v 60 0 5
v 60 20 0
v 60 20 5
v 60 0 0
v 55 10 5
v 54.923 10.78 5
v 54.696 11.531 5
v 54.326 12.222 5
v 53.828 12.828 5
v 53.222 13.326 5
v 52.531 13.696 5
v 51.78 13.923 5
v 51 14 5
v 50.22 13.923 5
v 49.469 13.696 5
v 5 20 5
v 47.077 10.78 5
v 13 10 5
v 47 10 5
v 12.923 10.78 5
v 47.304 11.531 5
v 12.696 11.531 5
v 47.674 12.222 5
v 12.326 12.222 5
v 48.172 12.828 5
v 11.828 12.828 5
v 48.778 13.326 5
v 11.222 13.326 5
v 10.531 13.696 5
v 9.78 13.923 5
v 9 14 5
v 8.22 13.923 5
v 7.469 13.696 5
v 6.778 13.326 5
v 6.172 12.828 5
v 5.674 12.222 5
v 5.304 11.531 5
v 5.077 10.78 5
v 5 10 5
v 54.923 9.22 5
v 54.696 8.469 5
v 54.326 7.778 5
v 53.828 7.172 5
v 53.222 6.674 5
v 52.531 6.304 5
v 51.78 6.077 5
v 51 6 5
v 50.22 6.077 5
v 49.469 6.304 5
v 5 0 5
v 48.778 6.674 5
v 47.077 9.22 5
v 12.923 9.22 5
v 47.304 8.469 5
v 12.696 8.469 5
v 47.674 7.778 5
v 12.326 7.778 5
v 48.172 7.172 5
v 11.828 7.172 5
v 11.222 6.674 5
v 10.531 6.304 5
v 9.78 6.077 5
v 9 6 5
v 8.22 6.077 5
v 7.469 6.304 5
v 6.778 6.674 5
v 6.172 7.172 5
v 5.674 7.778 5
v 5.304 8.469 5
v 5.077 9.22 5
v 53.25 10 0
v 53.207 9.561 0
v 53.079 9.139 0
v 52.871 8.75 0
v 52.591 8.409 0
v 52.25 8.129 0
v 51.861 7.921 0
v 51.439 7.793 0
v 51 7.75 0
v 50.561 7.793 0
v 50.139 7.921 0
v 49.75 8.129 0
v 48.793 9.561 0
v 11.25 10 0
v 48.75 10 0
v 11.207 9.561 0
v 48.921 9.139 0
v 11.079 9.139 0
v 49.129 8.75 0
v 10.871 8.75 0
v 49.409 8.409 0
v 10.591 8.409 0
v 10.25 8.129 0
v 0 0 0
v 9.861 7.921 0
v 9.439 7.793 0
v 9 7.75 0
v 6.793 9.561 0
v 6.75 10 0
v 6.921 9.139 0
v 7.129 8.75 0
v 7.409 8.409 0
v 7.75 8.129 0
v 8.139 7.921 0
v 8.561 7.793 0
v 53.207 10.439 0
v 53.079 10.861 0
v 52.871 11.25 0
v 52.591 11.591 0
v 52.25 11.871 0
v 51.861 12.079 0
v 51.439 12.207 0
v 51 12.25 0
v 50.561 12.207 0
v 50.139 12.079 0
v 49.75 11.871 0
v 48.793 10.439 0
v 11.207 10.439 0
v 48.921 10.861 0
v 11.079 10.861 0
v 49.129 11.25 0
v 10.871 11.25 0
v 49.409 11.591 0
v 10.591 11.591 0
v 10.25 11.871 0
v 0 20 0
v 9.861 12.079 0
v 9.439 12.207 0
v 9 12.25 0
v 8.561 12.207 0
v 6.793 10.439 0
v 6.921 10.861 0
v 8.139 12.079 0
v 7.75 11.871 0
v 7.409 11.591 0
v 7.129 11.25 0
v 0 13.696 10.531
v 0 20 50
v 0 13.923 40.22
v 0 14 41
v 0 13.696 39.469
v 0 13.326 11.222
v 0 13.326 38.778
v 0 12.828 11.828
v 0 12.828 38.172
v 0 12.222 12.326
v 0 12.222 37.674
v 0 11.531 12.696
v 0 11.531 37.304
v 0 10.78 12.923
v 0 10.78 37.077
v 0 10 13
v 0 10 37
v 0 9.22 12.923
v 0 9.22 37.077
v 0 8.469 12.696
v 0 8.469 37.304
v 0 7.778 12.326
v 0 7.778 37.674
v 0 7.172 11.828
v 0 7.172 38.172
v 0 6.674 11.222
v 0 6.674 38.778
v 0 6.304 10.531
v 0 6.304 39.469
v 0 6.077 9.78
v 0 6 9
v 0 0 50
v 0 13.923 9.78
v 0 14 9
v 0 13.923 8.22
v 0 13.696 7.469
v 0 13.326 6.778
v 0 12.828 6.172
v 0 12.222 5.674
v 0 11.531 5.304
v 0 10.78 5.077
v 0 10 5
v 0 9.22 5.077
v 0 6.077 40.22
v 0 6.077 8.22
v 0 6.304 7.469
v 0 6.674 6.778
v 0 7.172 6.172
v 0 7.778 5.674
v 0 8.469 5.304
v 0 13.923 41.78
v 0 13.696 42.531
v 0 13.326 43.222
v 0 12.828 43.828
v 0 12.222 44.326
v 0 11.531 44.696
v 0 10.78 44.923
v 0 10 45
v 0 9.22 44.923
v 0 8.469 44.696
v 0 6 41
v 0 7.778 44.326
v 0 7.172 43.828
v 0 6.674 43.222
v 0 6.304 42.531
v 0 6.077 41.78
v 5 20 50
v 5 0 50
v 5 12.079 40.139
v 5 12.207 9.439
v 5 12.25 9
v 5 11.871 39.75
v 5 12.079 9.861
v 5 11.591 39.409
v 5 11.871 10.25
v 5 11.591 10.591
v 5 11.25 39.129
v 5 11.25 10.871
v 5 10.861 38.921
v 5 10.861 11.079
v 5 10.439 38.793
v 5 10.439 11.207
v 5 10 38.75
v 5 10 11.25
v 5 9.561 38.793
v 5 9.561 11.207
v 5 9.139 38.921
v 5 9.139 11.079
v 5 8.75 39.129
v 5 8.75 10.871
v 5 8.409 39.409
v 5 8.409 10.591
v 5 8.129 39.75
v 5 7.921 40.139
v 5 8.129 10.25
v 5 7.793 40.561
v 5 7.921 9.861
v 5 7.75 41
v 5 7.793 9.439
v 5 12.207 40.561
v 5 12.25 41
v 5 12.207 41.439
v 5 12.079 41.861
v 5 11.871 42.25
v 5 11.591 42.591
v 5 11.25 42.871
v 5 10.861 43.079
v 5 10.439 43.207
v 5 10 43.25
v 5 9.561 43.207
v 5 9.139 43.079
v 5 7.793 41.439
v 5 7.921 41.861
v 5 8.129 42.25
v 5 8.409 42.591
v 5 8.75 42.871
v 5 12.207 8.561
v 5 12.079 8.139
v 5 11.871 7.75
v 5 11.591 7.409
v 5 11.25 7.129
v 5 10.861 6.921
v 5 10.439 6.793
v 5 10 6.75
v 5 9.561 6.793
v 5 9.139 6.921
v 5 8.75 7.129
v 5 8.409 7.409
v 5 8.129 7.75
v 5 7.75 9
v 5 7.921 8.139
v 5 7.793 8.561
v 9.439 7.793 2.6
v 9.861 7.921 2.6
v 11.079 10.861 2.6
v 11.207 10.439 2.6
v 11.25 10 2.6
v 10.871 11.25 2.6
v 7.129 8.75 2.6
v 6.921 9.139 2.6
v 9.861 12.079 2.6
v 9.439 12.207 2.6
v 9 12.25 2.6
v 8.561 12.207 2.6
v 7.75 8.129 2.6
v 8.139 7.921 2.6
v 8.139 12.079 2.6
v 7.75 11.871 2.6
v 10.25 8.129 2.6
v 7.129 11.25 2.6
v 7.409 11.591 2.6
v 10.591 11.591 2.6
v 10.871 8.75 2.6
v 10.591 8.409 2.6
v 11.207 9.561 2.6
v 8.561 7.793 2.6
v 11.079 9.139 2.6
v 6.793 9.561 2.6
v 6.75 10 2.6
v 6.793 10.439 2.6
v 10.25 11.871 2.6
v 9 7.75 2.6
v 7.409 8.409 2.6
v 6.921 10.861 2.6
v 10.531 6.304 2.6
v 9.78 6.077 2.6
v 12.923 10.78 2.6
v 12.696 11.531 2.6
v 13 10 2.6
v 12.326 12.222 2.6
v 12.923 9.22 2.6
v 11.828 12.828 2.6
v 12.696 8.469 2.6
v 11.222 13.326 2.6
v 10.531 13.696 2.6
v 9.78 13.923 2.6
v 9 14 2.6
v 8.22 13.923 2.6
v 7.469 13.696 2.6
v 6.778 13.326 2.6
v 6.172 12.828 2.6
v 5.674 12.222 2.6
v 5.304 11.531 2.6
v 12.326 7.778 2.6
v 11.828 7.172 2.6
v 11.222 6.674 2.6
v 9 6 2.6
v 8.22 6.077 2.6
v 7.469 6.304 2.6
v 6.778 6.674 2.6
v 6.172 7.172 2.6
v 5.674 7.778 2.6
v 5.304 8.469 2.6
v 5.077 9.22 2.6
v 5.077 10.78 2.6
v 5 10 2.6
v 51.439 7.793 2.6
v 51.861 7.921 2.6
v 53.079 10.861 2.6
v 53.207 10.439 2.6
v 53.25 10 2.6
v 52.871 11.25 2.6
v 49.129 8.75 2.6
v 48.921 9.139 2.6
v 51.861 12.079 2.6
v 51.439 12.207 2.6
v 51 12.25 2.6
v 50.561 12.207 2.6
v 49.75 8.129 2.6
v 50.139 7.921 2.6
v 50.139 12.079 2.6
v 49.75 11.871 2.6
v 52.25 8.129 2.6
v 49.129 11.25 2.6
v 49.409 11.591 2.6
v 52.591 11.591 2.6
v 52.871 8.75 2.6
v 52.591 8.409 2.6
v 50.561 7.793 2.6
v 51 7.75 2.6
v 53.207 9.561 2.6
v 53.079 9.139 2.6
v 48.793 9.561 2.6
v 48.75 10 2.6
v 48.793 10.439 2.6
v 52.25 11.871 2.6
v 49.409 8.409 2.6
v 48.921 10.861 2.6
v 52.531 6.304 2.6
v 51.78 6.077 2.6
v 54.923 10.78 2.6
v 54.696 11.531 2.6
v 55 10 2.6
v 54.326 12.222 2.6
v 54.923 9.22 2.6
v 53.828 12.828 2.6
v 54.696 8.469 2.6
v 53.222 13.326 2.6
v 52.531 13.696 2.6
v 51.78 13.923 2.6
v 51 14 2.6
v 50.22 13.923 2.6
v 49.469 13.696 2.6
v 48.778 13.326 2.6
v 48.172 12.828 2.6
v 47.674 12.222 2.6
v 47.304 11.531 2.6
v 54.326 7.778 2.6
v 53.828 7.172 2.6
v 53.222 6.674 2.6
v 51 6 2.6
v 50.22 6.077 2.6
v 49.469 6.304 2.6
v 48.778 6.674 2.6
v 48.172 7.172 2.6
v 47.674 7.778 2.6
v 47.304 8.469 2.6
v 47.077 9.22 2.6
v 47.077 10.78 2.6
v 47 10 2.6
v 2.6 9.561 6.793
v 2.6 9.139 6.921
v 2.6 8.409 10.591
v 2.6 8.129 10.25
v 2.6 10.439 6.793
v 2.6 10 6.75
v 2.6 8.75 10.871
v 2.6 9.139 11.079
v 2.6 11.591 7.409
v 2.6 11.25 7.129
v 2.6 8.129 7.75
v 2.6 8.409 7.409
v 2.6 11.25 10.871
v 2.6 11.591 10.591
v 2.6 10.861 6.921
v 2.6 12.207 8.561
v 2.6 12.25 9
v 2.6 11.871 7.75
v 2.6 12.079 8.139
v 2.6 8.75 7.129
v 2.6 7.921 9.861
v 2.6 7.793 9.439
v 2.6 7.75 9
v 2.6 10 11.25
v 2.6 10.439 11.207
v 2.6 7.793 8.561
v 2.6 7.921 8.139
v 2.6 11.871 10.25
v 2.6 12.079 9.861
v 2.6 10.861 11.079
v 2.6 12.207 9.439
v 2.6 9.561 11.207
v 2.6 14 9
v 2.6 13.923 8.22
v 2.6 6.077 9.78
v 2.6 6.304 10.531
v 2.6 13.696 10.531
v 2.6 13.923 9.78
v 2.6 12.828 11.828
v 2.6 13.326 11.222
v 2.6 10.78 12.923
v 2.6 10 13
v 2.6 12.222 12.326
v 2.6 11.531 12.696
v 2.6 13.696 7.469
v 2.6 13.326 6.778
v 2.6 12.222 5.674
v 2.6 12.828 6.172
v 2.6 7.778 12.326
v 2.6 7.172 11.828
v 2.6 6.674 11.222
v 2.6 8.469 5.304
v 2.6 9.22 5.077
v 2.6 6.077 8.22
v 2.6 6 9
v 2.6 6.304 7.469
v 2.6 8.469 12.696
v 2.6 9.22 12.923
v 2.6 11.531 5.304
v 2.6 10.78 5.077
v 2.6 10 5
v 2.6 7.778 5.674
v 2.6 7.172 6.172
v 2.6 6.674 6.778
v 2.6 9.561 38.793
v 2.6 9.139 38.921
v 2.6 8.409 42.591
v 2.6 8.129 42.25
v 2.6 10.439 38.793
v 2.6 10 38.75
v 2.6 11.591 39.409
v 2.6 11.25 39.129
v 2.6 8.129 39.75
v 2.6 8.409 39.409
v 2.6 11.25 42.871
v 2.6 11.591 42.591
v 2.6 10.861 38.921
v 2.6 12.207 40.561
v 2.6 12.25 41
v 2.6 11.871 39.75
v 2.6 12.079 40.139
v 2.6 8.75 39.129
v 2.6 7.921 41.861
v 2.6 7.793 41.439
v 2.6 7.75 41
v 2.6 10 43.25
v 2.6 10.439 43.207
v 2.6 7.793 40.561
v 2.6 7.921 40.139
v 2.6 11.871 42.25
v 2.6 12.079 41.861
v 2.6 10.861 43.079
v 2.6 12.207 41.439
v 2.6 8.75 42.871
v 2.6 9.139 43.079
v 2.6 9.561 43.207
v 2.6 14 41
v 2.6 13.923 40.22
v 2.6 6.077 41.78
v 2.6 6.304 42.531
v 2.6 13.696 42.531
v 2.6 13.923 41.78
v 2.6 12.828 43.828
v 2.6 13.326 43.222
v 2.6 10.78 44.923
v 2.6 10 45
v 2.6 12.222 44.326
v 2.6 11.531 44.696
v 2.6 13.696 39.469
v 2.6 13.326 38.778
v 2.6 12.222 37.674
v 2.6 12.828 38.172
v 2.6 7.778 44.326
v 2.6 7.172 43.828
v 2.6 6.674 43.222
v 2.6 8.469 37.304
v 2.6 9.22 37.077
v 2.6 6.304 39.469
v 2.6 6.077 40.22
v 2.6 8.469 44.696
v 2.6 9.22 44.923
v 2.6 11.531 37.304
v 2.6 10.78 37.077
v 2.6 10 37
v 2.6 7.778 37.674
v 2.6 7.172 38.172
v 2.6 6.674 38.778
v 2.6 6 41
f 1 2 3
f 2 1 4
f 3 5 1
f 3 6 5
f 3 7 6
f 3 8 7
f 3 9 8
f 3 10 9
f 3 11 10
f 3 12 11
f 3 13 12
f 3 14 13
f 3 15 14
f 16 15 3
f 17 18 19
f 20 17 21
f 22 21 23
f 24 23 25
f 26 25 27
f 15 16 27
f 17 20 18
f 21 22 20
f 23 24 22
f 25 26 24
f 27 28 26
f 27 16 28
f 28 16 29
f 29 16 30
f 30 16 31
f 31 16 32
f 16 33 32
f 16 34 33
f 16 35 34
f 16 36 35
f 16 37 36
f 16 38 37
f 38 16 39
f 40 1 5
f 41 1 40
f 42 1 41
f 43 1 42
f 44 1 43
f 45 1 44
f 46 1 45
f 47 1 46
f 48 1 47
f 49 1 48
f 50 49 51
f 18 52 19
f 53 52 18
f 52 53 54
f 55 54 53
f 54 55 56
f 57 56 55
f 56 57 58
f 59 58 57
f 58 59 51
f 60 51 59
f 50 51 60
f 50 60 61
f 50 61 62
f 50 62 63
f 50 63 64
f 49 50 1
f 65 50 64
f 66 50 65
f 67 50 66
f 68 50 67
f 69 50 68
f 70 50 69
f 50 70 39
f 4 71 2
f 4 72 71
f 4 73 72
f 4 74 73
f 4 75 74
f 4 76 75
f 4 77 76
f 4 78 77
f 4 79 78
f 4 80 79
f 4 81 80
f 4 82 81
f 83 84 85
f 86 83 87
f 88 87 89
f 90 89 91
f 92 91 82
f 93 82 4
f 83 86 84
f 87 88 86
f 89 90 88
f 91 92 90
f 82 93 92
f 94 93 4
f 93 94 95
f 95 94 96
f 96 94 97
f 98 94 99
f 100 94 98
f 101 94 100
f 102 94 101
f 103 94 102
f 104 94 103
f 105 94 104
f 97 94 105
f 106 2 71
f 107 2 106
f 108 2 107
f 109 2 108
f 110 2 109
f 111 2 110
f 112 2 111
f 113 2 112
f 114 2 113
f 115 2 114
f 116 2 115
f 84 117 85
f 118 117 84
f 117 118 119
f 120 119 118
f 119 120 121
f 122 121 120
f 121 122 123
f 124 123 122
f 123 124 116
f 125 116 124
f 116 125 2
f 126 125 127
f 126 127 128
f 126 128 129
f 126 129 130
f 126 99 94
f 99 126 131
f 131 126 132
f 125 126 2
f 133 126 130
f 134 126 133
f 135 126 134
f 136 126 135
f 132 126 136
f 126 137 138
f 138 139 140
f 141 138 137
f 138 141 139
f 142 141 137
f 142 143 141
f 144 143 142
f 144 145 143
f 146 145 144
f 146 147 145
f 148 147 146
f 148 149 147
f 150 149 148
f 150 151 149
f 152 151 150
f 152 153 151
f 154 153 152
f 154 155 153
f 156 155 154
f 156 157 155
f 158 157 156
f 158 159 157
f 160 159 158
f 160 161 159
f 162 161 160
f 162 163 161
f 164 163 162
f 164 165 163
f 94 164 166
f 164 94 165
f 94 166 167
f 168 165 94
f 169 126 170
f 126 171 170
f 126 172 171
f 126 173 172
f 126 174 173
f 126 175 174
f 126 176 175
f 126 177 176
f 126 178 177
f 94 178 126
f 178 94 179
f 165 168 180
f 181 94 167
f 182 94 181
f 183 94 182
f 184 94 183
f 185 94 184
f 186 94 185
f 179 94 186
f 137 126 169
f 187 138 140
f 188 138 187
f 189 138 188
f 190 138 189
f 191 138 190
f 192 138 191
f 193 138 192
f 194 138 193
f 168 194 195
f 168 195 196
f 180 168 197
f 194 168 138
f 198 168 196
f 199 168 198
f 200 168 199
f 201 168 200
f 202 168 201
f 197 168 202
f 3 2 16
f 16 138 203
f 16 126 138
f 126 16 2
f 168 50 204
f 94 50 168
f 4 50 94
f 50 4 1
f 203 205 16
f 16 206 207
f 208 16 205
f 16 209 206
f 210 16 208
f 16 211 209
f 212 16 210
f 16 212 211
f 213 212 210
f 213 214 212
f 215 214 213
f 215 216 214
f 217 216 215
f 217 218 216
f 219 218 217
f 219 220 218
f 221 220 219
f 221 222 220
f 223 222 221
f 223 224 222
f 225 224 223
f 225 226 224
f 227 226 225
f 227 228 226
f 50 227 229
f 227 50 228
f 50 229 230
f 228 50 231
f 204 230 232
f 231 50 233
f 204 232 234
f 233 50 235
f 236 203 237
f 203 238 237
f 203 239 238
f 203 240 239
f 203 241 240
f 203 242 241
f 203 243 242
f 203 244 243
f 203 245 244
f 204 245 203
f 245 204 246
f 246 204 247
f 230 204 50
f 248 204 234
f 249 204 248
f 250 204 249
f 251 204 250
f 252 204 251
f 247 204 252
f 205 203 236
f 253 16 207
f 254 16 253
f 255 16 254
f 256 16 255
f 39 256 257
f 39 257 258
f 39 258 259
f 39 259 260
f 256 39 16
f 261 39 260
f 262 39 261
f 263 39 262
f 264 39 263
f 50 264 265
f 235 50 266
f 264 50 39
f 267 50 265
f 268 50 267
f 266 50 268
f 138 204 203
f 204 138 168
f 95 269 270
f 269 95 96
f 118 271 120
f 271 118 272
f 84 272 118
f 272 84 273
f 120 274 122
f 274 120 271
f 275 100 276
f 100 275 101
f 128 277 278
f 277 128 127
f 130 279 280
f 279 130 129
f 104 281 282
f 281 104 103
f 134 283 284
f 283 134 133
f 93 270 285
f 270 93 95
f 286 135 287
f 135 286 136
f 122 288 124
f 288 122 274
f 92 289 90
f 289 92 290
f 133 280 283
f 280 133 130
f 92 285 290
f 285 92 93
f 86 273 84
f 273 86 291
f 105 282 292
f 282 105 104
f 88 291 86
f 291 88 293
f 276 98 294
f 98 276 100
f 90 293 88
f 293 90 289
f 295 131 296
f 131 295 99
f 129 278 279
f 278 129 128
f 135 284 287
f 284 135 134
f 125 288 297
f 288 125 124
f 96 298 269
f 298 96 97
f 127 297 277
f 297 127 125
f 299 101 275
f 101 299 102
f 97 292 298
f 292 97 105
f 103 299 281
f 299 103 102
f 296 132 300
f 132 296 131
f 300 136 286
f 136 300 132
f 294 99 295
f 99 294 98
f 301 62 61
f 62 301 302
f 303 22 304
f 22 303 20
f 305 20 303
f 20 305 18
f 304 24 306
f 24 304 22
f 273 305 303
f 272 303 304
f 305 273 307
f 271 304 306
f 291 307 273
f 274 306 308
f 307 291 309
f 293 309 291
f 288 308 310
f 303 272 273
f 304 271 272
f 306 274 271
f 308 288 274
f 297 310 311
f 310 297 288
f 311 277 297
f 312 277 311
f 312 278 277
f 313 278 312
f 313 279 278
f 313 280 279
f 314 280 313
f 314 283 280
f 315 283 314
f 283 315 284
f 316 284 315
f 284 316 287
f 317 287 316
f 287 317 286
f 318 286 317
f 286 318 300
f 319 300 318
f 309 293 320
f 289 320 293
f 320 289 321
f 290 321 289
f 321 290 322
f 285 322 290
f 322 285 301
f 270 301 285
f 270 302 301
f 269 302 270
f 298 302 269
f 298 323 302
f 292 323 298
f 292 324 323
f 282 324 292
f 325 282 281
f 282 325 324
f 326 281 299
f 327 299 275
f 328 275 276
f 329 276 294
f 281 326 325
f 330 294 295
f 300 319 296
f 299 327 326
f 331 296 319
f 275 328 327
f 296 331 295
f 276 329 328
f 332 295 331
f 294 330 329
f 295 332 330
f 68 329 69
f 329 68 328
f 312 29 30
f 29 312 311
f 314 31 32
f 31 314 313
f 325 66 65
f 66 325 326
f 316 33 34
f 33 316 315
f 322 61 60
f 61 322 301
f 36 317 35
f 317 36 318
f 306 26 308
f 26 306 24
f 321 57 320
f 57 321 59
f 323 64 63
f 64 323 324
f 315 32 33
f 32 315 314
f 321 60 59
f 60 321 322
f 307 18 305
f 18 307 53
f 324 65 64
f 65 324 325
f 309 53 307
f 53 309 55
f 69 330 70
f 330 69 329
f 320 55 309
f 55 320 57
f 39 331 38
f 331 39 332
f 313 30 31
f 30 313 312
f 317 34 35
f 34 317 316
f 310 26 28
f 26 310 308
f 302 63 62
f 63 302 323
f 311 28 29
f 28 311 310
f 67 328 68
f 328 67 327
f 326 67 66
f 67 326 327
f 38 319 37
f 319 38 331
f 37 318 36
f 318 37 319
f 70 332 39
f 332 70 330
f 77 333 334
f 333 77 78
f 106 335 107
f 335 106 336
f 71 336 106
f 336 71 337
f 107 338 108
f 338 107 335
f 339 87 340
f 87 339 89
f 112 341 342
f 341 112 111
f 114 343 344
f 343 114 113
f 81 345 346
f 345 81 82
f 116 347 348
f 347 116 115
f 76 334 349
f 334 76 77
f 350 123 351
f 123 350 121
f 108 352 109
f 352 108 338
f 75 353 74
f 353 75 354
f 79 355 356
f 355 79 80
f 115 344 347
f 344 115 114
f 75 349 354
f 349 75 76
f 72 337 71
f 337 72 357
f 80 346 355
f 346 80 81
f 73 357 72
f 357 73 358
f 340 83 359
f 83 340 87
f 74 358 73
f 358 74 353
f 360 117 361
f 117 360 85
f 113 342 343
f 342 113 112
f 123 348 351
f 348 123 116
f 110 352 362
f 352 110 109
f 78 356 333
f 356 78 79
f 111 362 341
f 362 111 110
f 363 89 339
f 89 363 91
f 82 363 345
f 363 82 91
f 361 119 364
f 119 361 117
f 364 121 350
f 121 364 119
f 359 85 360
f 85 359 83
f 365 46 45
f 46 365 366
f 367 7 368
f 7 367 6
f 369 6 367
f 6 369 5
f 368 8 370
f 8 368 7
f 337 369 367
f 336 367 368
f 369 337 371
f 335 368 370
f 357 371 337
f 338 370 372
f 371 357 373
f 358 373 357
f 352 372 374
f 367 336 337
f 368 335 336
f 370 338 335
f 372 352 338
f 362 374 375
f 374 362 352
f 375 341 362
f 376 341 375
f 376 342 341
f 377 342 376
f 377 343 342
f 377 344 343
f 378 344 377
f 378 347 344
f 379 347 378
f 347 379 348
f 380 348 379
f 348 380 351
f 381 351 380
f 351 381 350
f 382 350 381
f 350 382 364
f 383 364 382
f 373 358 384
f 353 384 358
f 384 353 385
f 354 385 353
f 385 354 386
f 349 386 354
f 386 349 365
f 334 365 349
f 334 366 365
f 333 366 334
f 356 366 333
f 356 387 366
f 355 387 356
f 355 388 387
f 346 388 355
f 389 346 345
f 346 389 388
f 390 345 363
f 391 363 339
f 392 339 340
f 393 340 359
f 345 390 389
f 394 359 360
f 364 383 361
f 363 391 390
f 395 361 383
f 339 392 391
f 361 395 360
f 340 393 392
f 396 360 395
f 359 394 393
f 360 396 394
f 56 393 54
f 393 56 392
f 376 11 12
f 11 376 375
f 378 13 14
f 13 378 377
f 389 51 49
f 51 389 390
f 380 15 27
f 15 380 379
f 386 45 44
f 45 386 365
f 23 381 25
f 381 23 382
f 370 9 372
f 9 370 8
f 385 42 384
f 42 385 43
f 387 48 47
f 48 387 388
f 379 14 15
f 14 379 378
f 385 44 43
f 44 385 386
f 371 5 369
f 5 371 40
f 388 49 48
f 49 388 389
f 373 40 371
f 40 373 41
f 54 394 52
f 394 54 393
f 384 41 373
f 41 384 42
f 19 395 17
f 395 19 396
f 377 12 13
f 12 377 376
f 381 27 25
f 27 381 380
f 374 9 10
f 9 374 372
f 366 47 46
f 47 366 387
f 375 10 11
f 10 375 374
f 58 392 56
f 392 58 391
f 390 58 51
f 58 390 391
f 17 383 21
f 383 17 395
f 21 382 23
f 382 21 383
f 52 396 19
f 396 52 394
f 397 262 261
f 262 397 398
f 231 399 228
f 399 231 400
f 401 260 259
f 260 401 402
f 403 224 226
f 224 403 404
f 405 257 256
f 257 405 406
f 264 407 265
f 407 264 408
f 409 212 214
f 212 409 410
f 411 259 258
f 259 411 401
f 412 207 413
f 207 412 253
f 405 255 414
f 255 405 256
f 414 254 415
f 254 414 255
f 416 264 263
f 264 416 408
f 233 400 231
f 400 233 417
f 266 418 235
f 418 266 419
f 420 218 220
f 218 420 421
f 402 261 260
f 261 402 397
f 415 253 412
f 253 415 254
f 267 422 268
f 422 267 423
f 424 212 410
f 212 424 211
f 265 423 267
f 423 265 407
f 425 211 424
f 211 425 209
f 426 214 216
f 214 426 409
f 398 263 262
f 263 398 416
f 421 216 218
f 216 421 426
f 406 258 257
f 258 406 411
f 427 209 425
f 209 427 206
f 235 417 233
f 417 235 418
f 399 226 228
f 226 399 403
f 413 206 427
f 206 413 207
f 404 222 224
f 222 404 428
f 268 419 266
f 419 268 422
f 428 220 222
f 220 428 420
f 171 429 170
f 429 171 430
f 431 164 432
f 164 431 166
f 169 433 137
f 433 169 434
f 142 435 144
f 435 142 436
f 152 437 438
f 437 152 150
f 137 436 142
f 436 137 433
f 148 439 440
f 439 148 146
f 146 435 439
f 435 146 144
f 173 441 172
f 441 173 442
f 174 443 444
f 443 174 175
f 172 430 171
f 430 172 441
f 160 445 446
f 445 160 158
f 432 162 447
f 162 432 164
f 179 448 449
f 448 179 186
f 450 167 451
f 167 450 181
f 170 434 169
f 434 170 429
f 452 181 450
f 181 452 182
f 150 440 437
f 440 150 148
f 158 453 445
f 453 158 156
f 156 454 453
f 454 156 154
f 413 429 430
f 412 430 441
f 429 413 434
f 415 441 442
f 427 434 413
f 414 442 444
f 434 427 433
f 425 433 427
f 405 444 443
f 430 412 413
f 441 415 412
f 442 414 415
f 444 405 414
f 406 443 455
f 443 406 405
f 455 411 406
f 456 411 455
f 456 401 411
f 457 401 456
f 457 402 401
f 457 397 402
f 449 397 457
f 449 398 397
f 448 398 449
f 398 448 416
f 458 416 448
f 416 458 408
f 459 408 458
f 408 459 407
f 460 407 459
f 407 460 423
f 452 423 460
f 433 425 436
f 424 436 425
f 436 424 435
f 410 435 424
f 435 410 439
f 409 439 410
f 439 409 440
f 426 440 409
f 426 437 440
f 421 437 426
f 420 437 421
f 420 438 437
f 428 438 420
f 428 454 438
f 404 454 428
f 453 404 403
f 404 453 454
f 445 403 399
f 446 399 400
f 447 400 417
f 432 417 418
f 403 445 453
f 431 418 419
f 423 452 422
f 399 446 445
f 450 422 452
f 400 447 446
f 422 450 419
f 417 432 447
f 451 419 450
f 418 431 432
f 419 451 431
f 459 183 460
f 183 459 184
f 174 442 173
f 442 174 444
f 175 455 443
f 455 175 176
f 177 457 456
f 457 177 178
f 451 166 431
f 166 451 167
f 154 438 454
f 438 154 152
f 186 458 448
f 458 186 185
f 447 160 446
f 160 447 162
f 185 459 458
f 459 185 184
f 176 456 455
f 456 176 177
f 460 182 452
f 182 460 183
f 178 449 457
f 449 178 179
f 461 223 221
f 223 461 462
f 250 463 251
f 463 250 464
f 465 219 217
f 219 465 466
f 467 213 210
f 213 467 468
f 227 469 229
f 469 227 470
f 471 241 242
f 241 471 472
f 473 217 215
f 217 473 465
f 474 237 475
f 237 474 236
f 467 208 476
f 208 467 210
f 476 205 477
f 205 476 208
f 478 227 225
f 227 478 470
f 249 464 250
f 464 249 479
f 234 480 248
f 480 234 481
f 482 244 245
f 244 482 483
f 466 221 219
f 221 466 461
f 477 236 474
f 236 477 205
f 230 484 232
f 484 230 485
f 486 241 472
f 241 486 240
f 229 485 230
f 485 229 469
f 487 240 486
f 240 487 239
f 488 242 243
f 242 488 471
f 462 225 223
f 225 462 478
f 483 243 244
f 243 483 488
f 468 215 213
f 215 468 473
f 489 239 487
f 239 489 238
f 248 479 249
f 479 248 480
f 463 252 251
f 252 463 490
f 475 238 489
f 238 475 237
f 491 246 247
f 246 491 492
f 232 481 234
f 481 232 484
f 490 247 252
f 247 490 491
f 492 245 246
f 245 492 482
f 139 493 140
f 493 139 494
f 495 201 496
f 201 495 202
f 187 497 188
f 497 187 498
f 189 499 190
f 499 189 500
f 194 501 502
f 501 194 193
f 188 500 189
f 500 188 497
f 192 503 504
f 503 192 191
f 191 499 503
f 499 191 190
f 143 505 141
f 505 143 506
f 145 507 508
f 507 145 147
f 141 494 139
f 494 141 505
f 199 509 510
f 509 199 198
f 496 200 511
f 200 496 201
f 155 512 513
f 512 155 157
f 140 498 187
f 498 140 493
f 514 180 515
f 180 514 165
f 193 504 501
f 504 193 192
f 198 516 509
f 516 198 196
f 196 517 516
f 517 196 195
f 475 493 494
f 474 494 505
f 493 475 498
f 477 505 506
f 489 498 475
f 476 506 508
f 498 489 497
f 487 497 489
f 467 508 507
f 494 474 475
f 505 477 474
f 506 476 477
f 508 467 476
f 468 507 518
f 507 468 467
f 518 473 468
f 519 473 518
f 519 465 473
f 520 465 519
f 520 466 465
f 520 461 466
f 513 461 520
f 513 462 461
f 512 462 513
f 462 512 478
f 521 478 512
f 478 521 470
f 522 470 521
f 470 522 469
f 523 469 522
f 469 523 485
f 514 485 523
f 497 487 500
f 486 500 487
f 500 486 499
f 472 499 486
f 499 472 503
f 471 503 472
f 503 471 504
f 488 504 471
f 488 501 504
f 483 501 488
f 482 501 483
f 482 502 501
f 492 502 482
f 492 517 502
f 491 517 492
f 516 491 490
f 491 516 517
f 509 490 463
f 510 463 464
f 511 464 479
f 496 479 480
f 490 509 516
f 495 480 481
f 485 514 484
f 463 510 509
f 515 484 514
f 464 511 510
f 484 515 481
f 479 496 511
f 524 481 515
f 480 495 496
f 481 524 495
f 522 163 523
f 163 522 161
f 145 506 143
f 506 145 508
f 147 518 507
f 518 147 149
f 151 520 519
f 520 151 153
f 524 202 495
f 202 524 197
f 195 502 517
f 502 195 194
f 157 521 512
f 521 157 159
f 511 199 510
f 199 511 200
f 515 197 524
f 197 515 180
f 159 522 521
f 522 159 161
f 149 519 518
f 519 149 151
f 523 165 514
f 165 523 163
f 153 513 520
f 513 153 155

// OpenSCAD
$fn = 32;

// ----------------------------------------------------------------------
// L-bracket: 60 x 20 x 50 mm
// ----------------------------------------------------------------------

// --- parameters (mm) ---
arm_x = 60;               // horizontal leg, X
arm_z = 50;               // vertical leg, Z
width = 20;               // bracket depth, Y
wall = 5;                 // plate thickness
hole_d = 4.5;             // clearance for M4
cb_d = 8;                 // counterbore seat
cb_h = 2.4;               // counterbore depth

module hole_z(px, py) {
  translate([px, py, -2.5]) cylinder(h = wall + 5, d = hole_d);
}
module hole_x(pz, py) {
  translate([-2.5, py, pz]) rotate([0, 90, 0]) cylinder(h = wall + 5, d = hole_d);
}
module cb_z(px, py) {
  translate([px, py, wall - cb_h]) cylinder(h = cb_h + 0.4, d = cb_d);
}
module cb_x(pz, py) {
  translate([wall - cb_h, py, pz]) rotate([0, -90, 0]) cylinder(h = cb_h + 0.4, d = cb_d);
}

difference() {
  union() {
    /* horizontal leg */
    cube([arm_x, width, wall]);
    /* vertical leg, overlapping the corner block */
    cube([wall, width, arm_z]);
  }
  hole_z(9, 10);
  cb_z(9, 10);
  hole_z(51, 10);
  cb_z(51, 10);
  hole_x(9, 10);
  cb_x(9, 10);
  hole_x(41, 10);
  cb_x(41, 10);
}
